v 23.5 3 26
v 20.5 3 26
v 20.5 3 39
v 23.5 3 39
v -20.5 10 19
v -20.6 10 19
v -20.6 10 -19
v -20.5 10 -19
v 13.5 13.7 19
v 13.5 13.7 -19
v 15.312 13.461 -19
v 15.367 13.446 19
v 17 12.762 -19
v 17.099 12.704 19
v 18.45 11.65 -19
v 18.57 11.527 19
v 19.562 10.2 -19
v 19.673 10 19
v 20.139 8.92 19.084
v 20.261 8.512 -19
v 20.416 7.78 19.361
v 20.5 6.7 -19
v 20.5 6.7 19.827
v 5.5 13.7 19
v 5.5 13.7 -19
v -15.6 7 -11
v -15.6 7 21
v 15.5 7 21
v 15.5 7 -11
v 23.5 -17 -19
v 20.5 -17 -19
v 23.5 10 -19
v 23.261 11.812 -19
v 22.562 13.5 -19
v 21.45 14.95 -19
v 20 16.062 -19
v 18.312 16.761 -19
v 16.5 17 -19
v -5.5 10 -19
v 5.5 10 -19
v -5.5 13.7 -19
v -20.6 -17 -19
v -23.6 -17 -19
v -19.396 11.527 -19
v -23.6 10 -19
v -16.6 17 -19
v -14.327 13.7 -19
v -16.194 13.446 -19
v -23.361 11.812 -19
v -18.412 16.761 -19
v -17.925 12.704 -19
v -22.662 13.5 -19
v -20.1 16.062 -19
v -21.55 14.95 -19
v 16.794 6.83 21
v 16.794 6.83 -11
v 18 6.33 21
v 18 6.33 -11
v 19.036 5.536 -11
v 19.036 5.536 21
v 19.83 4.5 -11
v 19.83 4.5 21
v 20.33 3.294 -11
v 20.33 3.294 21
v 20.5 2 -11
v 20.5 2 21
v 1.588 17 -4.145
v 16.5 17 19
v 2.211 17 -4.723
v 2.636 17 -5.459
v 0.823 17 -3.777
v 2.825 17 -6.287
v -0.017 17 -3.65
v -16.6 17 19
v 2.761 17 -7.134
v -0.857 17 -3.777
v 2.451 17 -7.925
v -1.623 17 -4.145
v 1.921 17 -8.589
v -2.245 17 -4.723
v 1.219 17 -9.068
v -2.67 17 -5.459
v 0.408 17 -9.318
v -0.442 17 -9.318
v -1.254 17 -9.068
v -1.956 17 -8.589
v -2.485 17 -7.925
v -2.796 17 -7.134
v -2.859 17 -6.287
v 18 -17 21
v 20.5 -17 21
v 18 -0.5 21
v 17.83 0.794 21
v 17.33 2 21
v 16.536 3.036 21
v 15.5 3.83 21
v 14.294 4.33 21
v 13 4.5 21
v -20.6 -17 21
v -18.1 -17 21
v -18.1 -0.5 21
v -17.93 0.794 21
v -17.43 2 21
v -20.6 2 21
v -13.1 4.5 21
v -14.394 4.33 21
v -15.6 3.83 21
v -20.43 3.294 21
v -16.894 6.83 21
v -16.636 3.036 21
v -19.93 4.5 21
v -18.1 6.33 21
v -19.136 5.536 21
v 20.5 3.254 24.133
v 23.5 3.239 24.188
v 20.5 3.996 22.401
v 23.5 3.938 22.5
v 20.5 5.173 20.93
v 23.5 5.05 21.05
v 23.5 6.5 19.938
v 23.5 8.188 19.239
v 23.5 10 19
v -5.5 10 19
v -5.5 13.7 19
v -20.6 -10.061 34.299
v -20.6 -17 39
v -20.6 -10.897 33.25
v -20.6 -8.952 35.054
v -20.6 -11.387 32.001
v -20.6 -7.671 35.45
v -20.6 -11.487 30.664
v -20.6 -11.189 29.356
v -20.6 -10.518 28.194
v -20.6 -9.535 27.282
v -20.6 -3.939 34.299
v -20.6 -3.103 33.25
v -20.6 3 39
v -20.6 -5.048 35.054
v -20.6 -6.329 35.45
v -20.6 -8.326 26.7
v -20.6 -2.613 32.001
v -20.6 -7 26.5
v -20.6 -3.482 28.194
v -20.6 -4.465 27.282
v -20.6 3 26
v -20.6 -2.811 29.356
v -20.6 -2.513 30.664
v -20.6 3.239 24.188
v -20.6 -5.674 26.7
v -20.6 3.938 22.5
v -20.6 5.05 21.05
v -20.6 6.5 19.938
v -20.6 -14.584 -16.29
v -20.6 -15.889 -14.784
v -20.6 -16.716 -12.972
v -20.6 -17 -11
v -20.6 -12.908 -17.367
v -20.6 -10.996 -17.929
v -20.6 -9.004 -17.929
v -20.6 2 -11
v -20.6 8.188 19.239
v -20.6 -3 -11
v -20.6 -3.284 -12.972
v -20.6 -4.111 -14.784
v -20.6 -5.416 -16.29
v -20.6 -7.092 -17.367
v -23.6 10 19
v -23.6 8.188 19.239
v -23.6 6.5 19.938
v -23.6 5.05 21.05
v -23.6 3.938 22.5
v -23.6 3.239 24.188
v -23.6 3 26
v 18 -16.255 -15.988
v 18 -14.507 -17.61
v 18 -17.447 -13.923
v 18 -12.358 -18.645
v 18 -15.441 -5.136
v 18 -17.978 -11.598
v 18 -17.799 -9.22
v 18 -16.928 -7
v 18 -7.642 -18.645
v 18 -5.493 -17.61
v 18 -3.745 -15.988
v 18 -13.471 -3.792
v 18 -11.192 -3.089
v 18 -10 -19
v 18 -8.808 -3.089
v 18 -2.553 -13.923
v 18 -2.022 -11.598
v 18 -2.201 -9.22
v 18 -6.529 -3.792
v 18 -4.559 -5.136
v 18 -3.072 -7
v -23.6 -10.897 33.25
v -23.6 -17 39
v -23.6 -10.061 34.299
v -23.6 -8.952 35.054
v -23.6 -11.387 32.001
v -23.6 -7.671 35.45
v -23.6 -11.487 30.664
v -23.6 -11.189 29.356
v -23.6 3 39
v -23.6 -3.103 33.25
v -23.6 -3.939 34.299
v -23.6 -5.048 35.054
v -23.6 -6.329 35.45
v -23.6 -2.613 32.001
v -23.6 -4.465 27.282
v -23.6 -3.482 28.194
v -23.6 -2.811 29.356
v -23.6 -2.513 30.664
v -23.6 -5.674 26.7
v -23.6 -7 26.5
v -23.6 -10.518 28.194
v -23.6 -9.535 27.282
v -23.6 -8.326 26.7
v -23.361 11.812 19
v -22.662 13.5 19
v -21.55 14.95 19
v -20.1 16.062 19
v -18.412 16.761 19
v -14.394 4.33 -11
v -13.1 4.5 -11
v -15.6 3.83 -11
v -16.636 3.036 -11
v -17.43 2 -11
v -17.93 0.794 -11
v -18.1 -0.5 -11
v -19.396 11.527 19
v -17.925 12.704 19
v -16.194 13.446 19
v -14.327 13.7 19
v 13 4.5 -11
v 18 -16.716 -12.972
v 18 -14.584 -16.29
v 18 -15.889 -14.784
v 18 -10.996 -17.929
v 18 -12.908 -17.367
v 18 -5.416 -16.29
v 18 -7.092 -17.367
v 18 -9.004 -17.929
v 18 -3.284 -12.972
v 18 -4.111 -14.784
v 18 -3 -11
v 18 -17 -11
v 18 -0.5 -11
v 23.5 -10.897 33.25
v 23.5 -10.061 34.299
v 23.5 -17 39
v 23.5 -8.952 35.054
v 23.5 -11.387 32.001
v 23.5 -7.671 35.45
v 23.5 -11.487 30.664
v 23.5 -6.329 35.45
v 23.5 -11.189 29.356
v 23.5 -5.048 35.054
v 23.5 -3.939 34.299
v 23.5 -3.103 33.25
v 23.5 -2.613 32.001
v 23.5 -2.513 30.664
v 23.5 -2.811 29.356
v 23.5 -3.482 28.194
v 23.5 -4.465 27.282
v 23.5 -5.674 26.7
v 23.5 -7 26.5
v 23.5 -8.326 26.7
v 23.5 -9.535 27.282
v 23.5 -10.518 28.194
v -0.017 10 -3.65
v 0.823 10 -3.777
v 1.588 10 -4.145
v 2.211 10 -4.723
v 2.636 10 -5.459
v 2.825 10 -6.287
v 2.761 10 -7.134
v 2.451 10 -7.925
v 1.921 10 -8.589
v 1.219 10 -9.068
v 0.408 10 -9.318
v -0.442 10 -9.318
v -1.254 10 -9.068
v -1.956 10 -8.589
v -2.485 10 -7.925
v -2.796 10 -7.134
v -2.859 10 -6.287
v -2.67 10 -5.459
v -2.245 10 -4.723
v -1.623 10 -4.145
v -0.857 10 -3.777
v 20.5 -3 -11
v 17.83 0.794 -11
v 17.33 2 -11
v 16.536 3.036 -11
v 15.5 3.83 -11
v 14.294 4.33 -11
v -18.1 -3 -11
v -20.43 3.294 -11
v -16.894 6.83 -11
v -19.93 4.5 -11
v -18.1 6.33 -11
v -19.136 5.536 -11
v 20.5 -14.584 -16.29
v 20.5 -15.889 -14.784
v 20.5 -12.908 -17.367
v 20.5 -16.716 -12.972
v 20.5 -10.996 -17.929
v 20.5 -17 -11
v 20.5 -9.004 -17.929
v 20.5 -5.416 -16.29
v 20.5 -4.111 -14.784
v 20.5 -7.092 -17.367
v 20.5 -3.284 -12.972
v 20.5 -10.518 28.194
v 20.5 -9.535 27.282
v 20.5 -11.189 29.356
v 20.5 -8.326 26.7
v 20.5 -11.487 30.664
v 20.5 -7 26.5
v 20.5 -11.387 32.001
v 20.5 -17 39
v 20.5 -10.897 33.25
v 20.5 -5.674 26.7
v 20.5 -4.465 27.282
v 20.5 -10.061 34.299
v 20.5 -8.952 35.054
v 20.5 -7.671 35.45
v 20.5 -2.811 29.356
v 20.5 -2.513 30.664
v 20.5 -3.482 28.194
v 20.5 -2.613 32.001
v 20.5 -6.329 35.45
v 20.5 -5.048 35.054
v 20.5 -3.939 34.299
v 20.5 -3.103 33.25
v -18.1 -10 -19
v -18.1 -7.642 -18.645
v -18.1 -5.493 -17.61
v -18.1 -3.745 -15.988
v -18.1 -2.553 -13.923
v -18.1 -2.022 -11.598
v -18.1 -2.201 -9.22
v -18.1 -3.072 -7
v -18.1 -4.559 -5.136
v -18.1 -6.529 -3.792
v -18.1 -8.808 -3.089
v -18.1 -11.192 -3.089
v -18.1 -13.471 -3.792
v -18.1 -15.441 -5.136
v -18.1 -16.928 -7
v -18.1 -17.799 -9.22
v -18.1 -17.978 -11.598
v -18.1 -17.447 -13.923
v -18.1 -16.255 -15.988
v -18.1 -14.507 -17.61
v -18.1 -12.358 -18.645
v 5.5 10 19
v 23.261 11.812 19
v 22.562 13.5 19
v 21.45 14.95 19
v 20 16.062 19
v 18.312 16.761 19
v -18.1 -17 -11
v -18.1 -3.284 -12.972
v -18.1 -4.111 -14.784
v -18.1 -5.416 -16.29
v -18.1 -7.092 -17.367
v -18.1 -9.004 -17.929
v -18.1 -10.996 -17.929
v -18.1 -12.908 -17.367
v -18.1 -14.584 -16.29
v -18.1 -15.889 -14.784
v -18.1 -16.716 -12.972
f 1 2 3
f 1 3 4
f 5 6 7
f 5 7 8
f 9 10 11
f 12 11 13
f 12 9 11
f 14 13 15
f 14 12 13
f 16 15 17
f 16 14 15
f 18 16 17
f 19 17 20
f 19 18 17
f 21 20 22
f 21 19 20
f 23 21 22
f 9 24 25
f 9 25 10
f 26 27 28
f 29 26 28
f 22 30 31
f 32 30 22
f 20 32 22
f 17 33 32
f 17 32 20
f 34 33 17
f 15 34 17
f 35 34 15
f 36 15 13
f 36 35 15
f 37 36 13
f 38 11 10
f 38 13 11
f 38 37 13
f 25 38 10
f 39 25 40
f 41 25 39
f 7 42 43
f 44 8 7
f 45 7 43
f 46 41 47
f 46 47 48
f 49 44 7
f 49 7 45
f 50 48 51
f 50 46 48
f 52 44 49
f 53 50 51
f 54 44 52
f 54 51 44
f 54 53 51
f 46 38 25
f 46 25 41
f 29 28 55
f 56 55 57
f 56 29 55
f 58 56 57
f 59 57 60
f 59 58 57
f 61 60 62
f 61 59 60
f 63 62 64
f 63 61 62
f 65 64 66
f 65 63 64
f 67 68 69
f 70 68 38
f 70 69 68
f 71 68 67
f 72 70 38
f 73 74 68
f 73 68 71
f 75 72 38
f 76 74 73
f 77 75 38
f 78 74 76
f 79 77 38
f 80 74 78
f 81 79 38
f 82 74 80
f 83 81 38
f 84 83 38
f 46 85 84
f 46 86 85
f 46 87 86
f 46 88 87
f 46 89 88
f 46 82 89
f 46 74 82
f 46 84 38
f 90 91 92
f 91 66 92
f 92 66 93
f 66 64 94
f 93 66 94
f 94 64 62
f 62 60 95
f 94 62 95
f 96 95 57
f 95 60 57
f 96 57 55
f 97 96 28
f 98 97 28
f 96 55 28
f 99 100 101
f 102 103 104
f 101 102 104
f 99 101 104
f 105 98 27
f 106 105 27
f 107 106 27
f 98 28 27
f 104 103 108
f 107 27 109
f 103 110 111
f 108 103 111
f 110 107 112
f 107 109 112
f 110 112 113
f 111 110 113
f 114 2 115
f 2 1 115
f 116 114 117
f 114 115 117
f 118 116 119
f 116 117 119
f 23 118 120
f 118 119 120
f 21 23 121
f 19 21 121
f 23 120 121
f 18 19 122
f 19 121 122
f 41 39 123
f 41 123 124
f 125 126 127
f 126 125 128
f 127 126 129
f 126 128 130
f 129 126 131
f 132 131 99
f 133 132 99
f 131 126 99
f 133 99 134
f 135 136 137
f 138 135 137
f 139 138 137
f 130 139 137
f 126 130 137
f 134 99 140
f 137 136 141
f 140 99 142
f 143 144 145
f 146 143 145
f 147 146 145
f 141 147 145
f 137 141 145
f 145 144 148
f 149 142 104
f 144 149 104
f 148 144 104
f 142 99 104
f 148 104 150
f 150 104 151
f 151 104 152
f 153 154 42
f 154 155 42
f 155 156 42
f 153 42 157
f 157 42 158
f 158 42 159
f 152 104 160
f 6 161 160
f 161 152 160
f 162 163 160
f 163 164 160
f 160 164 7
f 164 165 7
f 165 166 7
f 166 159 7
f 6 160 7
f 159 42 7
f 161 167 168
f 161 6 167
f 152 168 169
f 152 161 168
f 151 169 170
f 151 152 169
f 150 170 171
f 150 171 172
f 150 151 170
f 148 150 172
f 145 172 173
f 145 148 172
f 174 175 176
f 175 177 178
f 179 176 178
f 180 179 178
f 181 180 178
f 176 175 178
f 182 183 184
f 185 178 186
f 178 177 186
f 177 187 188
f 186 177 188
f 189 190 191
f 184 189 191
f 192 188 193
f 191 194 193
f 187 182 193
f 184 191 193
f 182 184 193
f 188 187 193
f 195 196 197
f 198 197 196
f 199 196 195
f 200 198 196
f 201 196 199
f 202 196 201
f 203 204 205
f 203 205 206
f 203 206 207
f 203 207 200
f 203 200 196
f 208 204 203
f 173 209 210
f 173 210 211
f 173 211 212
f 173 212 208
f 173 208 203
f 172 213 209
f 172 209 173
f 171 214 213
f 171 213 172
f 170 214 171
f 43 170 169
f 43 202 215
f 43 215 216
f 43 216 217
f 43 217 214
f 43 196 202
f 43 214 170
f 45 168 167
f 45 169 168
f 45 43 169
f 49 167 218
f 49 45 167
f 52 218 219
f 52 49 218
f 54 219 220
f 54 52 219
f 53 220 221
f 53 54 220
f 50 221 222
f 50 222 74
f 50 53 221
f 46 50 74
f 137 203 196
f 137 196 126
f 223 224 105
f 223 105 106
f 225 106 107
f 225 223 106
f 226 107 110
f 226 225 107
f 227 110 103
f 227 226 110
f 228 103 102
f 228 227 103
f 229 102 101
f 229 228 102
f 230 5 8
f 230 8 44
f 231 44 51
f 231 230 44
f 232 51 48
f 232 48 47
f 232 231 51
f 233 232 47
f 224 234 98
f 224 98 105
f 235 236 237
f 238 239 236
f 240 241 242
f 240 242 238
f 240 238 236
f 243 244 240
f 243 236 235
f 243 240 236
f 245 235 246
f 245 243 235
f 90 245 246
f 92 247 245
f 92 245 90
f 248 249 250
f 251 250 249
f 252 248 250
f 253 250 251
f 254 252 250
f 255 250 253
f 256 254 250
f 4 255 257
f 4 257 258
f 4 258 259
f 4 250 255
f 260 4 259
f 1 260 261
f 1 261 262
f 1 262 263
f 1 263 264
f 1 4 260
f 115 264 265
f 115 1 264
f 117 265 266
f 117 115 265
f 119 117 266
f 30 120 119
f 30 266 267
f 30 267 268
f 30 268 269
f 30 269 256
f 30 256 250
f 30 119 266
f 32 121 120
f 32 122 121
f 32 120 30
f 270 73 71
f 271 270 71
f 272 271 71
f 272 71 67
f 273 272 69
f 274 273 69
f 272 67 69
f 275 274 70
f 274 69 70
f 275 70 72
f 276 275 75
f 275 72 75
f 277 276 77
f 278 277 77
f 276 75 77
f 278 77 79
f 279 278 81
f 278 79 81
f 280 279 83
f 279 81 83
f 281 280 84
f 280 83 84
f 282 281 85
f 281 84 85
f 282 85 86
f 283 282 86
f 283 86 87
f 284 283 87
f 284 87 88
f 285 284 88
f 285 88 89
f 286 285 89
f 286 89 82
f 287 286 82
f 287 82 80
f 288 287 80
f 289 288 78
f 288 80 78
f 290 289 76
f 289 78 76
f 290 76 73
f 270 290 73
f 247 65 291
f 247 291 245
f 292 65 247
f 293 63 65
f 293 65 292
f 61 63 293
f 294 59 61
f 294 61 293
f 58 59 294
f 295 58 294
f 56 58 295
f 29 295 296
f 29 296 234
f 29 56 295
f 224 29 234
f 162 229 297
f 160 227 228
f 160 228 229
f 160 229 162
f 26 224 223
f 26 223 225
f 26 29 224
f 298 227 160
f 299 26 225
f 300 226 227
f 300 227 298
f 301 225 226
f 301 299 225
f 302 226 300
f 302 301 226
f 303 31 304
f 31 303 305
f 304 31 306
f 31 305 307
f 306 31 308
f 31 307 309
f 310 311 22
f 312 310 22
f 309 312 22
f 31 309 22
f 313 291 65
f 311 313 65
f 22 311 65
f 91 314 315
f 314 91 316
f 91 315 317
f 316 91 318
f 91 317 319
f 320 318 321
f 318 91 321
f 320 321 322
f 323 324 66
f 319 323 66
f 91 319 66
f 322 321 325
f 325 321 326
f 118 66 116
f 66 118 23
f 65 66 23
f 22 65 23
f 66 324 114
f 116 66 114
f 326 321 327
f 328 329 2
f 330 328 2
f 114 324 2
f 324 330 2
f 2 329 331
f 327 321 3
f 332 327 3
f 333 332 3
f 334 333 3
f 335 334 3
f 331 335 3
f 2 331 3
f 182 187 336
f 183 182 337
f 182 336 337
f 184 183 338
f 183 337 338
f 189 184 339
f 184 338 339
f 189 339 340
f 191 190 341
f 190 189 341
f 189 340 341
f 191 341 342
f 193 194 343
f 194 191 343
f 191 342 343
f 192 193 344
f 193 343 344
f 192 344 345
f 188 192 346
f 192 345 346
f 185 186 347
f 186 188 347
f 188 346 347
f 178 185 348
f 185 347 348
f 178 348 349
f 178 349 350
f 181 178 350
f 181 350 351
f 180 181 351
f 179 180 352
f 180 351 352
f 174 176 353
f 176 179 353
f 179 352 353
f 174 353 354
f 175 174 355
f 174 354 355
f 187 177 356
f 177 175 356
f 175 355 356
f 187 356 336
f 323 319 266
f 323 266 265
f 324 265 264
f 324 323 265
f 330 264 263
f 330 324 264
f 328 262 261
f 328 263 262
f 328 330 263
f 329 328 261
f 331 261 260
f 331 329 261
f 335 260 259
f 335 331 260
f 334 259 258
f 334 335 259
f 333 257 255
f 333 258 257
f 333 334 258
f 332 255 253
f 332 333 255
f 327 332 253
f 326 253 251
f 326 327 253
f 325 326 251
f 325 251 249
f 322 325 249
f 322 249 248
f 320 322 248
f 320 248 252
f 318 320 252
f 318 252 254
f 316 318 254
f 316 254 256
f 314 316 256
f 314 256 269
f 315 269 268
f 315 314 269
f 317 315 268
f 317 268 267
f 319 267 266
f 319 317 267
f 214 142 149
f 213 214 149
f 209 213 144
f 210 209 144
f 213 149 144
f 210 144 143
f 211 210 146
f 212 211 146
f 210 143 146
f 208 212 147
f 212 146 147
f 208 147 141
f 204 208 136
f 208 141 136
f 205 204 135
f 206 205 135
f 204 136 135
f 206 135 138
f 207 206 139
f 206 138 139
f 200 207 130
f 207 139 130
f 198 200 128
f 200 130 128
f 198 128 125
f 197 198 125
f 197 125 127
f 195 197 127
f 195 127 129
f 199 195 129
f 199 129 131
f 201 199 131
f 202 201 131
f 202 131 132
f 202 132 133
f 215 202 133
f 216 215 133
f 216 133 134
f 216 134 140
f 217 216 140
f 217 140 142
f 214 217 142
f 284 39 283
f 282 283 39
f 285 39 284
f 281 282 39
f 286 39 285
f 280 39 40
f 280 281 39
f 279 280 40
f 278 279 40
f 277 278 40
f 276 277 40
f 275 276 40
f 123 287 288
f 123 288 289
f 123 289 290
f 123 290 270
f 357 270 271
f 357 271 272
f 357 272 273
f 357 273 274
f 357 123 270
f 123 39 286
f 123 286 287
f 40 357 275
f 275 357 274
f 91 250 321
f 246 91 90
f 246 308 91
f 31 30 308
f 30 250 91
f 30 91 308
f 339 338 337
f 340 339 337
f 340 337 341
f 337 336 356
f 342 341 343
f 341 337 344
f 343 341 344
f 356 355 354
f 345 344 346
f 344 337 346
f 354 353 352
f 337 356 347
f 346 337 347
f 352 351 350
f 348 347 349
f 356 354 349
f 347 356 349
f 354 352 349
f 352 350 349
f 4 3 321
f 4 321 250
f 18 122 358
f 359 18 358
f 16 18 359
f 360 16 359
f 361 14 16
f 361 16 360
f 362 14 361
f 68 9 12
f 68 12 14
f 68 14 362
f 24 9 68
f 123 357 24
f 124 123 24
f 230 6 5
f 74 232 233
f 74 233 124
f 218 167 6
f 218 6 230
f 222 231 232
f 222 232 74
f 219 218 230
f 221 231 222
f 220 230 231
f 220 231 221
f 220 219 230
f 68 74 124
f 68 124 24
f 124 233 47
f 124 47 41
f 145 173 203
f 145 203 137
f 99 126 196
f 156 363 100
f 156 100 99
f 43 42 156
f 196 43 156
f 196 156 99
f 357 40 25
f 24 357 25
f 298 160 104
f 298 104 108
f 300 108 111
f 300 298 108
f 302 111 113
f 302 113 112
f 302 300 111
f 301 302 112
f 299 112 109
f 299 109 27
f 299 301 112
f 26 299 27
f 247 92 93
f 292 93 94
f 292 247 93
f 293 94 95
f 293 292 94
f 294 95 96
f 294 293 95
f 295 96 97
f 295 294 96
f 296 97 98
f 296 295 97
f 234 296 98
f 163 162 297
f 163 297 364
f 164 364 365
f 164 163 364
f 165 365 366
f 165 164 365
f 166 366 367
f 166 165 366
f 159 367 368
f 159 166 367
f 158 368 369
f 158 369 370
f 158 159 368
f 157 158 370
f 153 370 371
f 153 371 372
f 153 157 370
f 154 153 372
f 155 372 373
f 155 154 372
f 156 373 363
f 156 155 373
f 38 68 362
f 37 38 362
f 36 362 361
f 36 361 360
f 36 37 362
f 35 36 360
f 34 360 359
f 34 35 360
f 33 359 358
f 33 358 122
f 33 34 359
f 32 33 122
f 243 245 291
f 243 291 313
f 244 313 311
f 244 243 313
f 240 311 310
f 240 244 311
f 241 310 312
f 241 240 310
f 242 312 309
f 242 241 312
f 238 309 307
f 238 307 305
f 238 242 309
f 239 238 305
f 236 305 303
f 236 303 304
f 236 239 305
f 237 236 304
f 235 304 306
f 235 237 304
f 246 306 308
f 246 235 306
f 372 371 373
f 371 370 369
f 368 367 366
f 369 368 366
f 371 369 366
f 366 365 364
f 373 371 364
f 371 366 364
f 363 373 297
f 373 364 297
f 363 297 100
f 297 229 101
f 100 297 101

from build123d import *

# Parameters (mm, degrees)
BOSS_EXTRUDE1_DEPTH             = 23.5
BOSS_EXTRUDE1_DEPTH_BACK        = 23.6
SKETCH1_W                       = 38
SKETCH1_H                       = 34
SKETCH2_W                       = 41.1
SKETCH2_H                       = 27
CUT_EXTRUDE1_DEPTH              = 38
FILLET1_R                       = 7
SKETCH3_W                       = 15
SKETCH3_H                       = 3.7
CUT_EXTRUDE2_DEPTH              = 38
FILLET2_R                       = 7
SKETCH4_W                       = 3
SKETCH4_H                       = 20
BOSS_EXTRUDE2_DEPTH             = 20
FILLET3_R                       = 7
CUT_EXTRUDE3_REACH              = 50.651
SKETCH5_R                       = 4.5
CUT_EXTRUDE3_DIRECTION_2_REACH  = 50.651
BOSS_EXTRUDE3_DEPTH             = 40
CUT_EXTRUDE4_DEPTH              = 8
BOSS_EXTRUDE4_DEPTH             = 2.5
BOSS_EXTRUDE5_START             = 2.5
BOSS_EXTRUDE5_DEPTH             = 2.5
BOSS_EXTRUDE6_REACH             = 50.651
SKETCH11_R                      = 8
BOSS_EXTRUDE6_DIRECTION_2_REACH = 50.651
SKETCH12_R                      = 2.85
CUT_EXTRUDE5_DEPTH              = 7


with BuildPart() as part:
    # Sketch1 → Boss-Extrude1 (new, two sides: drawn at the far end of the back side and taken through both)
    with BuildSketch(Plane(origin=(0, 0, 0), x_dir=(0, 0, -1), z_dir=(1, 0, 0)).offset(-BOSS_EXTRUDE1_DEPTH_BACK)):
        Rectangle(SKETCH1_W, SKETCH1_H)
    extrude(amount=BOSS_EXTRUDE1_DEPTH + BOSS_EXTRUDE1_DEPTH_BACK)

    # Sketch2 → Cut-Extrude1 (cut)
    with BuildSketch(Plane.XY.offset(19)):
        with Locations((-0.05, -3.5)):
            Rectangle(SKETCH2_W, SKETCH2_H)
    extrude(amount=-CUT_EXTRUDE1_DEPTH, mode=Mode.SUBTRACT)

    # Fillet1
    fillet1_edges = [part.edges().sort_by_distance(p)[0] for p in [
        (23.5, 17, 0),
        (-23.6, 17, 0),
    ]]
    fillet(fillet1_edges, radius=FILLET1_R)

    # Sketch3 → Cut-Extrude2 (cut)
    with BuildSketch(Plane.XY.offset(19)):
        with Locations((13, 11.85)):
            Rectangle(SKETCH3_W, SKETCH3_H)
        with Locations((-13, 11.85)):
            Rectangle(SKETCH3_W, SKETCH3_H)
    extrude(amount=-CUT_EXTRUDE2_DEPTH, mode=Mode.SUBTRACT)

    # Fillet2
    # the kernel refuses this fillet: 7 mm, written as the material it adds along each edge
    with BuildSketch(Plane(origin=(-20.5, 13.7, 19), x_dir=(1, 0, 0), z_dir=(0, 0, -1))) as fillet2_piece_1:
        with BuildLine():
            CenterArc((6.173329734, 7), FILLET2_R, 208.127068219, 61.872931781)
            Line((0, 3.7), (-0.123466595, 3.634))
            ThreePointArc((-0.123466595, 3.634), (-0.14, 1.85), (-0.14, 0))
            Line((-0.14, 0), (0, -0.14))
            Line((0, -0.14), (6.173329734, -0.14))
            Line((6.173329734, -0.14), (6.173329734, 0))
        make_face()
    extrude(amount=38)
    with BuildSketch(Plane(origin=(20.5, 13.7, 19), x_dir=(0, -1, 0), z_dir=(0, 0, -1))) as fillet2_piece_2:
        with BuildLine():
            CenterArc((FILLET2_R, FILLET2_R), FILLET2_R, 180, 90)
            Line((0, FILLET2_R), (-FILLET2_R * 0.02, FILLET2_R))
            Line((-FILLET2_R * 0.02, FILLET2_R), (-FILLET2_R * 0.02, -FILLET2_R * 0.02))
            Line((-FILLET2_R * 0.02, -FILLET2_R * 0.02), (FILLET2_R, -FILLET2_R * 0.02))
            Line((FILLET2_R, -FILLET2_R * 0.02), (FILLET2_R, 0))
        make_face()
    extrude(amount=38)

    # Sketch4 → Boss-Extrude2 (add)
    with BuildSketch(Plane.XY.offset(19)):
        with Locations((-22.1, -7)):
            Rectangle(SKETCH4_W, SKETCH4_H)
        with Locations((22, -7)):
            Rectangle(SKETCH4_W, SKETCH4_H)
    extrude(amount=BOSS_EXTRUDE2_DEPTH)

    # Fillet3
    fillet3_edges = [part.edges().sort_by_distance(p)[0] for p in [
        (-22.1, 3, 19),
        (22, 3, 19),
    ]]
    fillet(fillet3_edges, radius=FILLET3_R)

    # Cut-Extrude3: up to this face of the body (flat: up to its plane)
    cut_extrude3_end = Plane(part.part.faces().sort_by_distance((-23.6, -4.415554034, 8.225623848))[0])
    # Sketch5 → Cut-Extrude3 (cut, up to the picked face)
    with BuildSketch(Plane(origin=(0, 0, 0), x_dir=(0, 0, -1), z_dir=(1, 0, 0)), mode=Mode.PRIVATE) as cut_extrude3_sk1:
        with Locations((-31, -7)):
            Circle(SKETCH5_R)
    cut_extrude3_tool1 = split(extrude(cut_extrude3_sk1.sketch, amount=-CUT_EXTRUDE3_REACH, mode=Mode.PRIVATE), bisect_by=cut_extrude3_end, keep=Keep.BOTH, mode=Mode.PRIVATE)
    add(cut_extrude3_tool1.solids().sort_by(Axis((0, -7, 31), (-1, 0, 0)))[0], mode=Mode.SUBTRACT)

    # Cut-Extrude3 direction 2: up to this face of the body (flat: up to its plane)
    cut_extrude3_direction_2_end = Plane(part.part.faces().sort_by_distance((23.5, -4.415554034, 8.225623848))[0])
    # Sketch5 → Cut-Extrude3 direction 2 (cut, up to the picked face)
    with BuildSketch(Plane(origin=(0, 0, 0), x_dir=(0, 0, -1), z_dir=(1, 0, 0)), mode=Mode.PRIVATE) as cut_extrude3_direction_2_sk1:
        with Locations((-31, -7)):
            Circle(SKETCH5_R)
    cut_extrude3_direction_2_tool1 = split(extrude(cut_extrude3_direction_2_sk1.sketch, amount=CUT_EXTRUDE3_DIRECTION_2_REACH, mode=Mode.PRIVATE), bisect_by=cut_extrude3_direction_2_end, keep=Keep.BOTH, mode=Mode.PRIVATE)
    add(cut_extrude3_direction_2_tool1.solids().sort_by(Axis((0, -7, 31), (1, 0, 0)))[0], mode=Mode.SUBTRACT)

    # Sketch6 → Boss-Extrude3 (add)
    with BuildSketch(Plane(origin=(0, 0, -19), x_dir=(-1, 0, 0), z_dir=(0, 0, -1))):
        with BuildLine():
            Line((-20.5, -17), (-18, -17))
            Line((-18, -17), (-18, -0.5))
            ThreePointArc((-18, -0.5), (-16.535533906, 3.035533906), (-13, 4.5))
            Line((-13, 4.5), (13.1, 4.5))
            ThreePointArc((13.1, 4.5), (16.635533906, 3.035533906), (18.1, -0.5))
            Line((18.1, -0.5), (18.1, -17))
            Line((18.1, -17), (20.6, -17))
            Line((20.6, -17), (20.6, 2))
            ThreePointArc((20.6, 2), (19.135533906, 5.535533906), (15.6, 7))
            Line((15.6, 7), (-15.5, 7))
            ThreePointArc((-15.5, 7), (-19.035533906, 5.535533906), (-20.5, 2))
            Line((-20.5, 2), (-20.5, -17))
        make_face()
    extrude(amount=-BOSS_EXTRUDE3_DEPTH)

    # Sketch7 → Cut-Extrude4 (cut)
    with BuildSketch(Plane(origin=(0, 0, -19), x_dir=(-1, 0, 0), z_dir=(0, 0, -1))):
        with BuildLine():
            Line((-20.5, 2), (-20.5, -17))
            Line((-20.5, -17), (-18, -17))
            Line((-18, -17), (-18, -0.5))
            ThreePointArc((-18, -0.5), (-16.535533906, 3.035533906), (-13, 4.5))
            Line((-13, 4.5), (13.1, 4.5))
            ThreePointArc((13.1, 4.5), (16.635533906, 3.035533906), (18.1, -0.5))
            Line((18.1, -0.5), (18.1, -17))
            Line((18.1, -17), (20.6, -17))
            Line((20.6, -17), (20.6, 2))
            ThreePointArc((20.6, 2), (19.135533906, 5.535533906), (15.6, 7))
            Line((15.6, 7), (-15.5, 7))
            ThreePointArc((-15.5, 7), (-19.035533906, 5.535533906), (-20.5, 2))
        make_face()
    extrude(amount=-CUT_EXTRUDE4_DEPTH, mode=Mode.SUBTRACT)

    # Sketch8 → Boss-Extrude4 (add)
    with BuildSketch(Plane(origin=(-20.6, 0, 0), x_dir=(0, 0, -1), z_dir=(1, 0, 0))):
        with BuildLine():
            Line((11, -17), (11, -3))
            ThreePointArc((11, -3), (18, -10), (11, -17))
        make_face()
    extrude(amount=BOSS_EXTRUDE4_DEPTH)

    # Sketch9 → Boss-Extrude5 (add)
    with BuildSketch(Plane.ZY.offset(-20.5).offset(BOSS_EXTRUDE5_START)):
        with BuildLine():
            Line((-11, -17), (-11, -3))
            ThreePointArc((-11, -3), (-18, -10), (-11, -17))
        make_face()
    extrude(amount=-BOSS_EXTRUDE5_DEPTH)


with BuildPart() as body_2:

    # Boss-Extrude6: up to this face of the body (flat: up to its plane)
    boss_extrude6_end = Plane(part.part.faces().sort_by_distance((-18.1, -8.909035044, 2.586370643))[0])
    # Sketch11 → Boss-Extrude6 (new, up to the picked face)
    with BuildSketch(Plane(origin=(0, 0, 0), x_dir=(0, 0, -1), z_dir=(1, 0, 0)), mode=Mode.PRIVATE) as boss_extrude6_sk1:
        with Locations((11, -10)):
            Circle(SKETCH11_R)
    boss_extrude6_tool1 = split(extrude(boss_extrude6_sk1.sketch, amount=-BOSS_EXTRUDE6_REACH, mode=Mode.PRIVATE), bisect_by=boss_extrude6_end, keep=Keep.BOTH, mode=Mode.PRIVATE)
    add(boss_extrude6_tool1.solids().sort_by(Axis((0, -10, -11), (-1, 0, 0)))[0])


    # Boss-Extrude6 direction 2: up to this face of the body (flat: up to its plane)
    boss_extrude6_direction_2_end = Plane(part.part.faces().sort_by_distance((18, -8.909035044, 2.586370643))[0])
    # Sketch11 → Boss-Extrude6 direction 2 (add, up to the picked face)
    with BuildSketch(Plane(origin=(0, 0, 0), x_dir=(0, 0, -1), z_dir=(1, 0, 0)), mode=Mode.PRIVATE) as boss_extrude6_direction_2_sk1:
        with Locations((11, -10)):
            Circle(SKETCH11_R)
    boss_extrude6_direction_2_tool1 = split(extrude(boss_extrude6_direction_2_sk1.sketch, amount=BOSS_EXTRUDE6_DIRECTION_2_REACH, mode=Mode.PRIVATE), bisect_by=boss_extrude6_direction_2_end, keep=Keep.BOTH, mode=Mode.PRIVATE)
    add(boss_extrude6_direction_2_tool1.solids().sort_by(Axis((0, -10, -11), (1, 0, 0)))[0])


with BuildPart() as part_1:
    add(part.part)

    # Sketch12 → Cut-Extrude5 (cut)
    with BuildSketch(Plane(origin=(0, 17, 0), x_dir=(1, 0, 0), z_dir=(0, 1, 0))):
        with Locations(Location((-0.017105263, 6.5, 0), (0, 0, 270))):
            Circle(SKETCH12_R)
    extrude(amount=-CUT_EXTRUDE5_DEPTH, mode=Mode.SUBTRACT)


solid = Compound([body_2.part, part_1.part])
